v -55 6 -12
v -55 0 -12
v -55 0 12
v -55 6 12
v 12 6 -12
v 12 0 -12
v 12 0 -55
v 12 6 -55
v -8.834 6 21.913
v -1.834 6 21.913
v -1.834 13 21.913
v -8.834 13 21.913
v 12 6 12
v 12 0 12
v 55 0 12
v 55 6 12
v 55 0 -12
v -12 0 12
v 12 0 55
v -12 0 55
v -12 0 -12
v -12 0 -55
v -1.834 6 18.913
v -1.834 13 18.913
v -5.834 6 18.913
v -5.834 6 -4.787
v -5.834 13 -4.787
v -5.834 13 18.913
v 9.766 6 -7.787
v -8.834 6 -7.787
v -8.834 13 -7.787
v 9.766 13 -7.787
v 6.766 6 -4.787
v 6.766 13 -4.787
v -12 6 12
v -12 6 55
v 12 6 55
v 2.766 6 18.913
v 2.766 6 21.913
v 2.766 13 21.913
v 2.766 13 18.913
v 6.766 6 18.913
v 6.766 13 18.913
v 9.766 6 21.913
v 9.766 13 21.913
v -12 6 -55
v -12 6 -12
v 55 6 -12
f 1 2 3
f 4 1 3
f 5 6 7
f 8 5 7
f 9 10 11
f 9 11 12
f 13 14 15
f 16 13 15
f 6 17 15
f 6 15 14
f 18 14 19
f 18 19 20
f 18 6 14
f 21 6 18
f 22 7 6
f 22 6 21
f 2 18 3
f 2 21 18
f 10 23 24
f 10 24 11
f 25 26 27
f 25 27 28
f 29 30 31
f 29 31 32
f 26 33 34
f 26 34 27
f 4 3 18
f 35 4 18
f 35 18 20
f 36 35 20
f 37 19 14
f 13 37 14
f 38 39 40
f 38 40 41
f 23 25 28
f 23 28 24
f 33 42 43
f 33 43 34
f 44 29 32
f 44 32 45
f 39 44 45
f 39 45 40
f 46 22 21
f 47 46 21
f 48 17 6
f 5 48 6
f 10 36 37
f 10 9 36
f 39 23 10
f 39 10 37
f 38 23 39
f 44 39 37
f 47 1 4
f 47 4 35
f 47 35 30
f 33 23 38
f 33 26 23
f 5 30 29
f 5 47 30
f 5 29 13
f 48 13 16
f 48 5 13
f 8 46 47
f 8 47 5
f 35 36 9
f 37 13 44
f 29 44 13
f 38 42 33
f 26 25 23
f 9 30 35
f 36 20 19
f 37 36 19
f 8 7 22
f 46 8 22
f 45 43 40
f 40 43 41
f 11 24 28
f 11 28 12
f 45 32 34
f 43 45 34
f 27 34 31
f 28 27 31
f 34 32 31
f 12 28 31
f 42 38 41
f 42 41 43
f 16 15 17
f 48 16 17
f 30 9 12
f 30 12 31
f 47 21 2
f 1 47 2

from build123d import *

# Parameters (mm, degrees)
BOSS_EXTRUDE18_DEPTH = 6
SKETCH22_R           = 12
BOSS_EXTRUDE19_DEPTH = 6
BOSS_EXTRUDE20_DEPTH = 13


with BuildPart() as part:
    # Sketch21 → Boss-Extrude18 (new body)
    with BuildSketch(Plane(origin=(0, 0, 0), x_dir=(1, 0, 0), z_dir=(0, 1, 0))):
        Polygon((0, 55), (-12, 55), (-12, 12), (-55, 12), (-55, 0), (-55, -12), (-12, -12), (-12, -55), (0, -55), (12, -55), (12, -12), (55, -12), (55, 0), (55, 12), (12, 12), (12, 55), align=None)
    extrude(amount=BOSS_EXTRUDE18_DEPTH)

    # Sketch22 → Boss-Extrude19 (add)
    with BuildSketch(Plane(origin=(0, 0, 0), x_dir=(1, 0, 0), z_dir=(0, 1, 0))):
        Circle(SKETCH22_R)
    extrude(amount=BOSS_EXTRUDE19_DEPTH)

    # Sketch16 → Boss-Extrude20 (add)
    with BuildSketch(Plane(origin=(0, 0, 0), x_dir=(1, 0, 0), z_dir=(0, 1, 0))):
        Polygon((-8.834281574, 7.787269814), (9.765718426, 7.787269814), (9.765718426, -21.912730186), (2.765718426, -21.912730186), (2.765718426, -18.912730186), (6.765718426, -18.912730186), (6.765718426, 4.787269814), (-5.834281574, 4.787269814), (-5.834281574, -18.912730186), (-1.834281574, -18.912730186), (-1.834281574, -21.912730186), (-8.834281574, -21.912730186), align=None)
    extrude(amount=BOSS_EXTRUDE20_DEPTH)


solid = part.part
